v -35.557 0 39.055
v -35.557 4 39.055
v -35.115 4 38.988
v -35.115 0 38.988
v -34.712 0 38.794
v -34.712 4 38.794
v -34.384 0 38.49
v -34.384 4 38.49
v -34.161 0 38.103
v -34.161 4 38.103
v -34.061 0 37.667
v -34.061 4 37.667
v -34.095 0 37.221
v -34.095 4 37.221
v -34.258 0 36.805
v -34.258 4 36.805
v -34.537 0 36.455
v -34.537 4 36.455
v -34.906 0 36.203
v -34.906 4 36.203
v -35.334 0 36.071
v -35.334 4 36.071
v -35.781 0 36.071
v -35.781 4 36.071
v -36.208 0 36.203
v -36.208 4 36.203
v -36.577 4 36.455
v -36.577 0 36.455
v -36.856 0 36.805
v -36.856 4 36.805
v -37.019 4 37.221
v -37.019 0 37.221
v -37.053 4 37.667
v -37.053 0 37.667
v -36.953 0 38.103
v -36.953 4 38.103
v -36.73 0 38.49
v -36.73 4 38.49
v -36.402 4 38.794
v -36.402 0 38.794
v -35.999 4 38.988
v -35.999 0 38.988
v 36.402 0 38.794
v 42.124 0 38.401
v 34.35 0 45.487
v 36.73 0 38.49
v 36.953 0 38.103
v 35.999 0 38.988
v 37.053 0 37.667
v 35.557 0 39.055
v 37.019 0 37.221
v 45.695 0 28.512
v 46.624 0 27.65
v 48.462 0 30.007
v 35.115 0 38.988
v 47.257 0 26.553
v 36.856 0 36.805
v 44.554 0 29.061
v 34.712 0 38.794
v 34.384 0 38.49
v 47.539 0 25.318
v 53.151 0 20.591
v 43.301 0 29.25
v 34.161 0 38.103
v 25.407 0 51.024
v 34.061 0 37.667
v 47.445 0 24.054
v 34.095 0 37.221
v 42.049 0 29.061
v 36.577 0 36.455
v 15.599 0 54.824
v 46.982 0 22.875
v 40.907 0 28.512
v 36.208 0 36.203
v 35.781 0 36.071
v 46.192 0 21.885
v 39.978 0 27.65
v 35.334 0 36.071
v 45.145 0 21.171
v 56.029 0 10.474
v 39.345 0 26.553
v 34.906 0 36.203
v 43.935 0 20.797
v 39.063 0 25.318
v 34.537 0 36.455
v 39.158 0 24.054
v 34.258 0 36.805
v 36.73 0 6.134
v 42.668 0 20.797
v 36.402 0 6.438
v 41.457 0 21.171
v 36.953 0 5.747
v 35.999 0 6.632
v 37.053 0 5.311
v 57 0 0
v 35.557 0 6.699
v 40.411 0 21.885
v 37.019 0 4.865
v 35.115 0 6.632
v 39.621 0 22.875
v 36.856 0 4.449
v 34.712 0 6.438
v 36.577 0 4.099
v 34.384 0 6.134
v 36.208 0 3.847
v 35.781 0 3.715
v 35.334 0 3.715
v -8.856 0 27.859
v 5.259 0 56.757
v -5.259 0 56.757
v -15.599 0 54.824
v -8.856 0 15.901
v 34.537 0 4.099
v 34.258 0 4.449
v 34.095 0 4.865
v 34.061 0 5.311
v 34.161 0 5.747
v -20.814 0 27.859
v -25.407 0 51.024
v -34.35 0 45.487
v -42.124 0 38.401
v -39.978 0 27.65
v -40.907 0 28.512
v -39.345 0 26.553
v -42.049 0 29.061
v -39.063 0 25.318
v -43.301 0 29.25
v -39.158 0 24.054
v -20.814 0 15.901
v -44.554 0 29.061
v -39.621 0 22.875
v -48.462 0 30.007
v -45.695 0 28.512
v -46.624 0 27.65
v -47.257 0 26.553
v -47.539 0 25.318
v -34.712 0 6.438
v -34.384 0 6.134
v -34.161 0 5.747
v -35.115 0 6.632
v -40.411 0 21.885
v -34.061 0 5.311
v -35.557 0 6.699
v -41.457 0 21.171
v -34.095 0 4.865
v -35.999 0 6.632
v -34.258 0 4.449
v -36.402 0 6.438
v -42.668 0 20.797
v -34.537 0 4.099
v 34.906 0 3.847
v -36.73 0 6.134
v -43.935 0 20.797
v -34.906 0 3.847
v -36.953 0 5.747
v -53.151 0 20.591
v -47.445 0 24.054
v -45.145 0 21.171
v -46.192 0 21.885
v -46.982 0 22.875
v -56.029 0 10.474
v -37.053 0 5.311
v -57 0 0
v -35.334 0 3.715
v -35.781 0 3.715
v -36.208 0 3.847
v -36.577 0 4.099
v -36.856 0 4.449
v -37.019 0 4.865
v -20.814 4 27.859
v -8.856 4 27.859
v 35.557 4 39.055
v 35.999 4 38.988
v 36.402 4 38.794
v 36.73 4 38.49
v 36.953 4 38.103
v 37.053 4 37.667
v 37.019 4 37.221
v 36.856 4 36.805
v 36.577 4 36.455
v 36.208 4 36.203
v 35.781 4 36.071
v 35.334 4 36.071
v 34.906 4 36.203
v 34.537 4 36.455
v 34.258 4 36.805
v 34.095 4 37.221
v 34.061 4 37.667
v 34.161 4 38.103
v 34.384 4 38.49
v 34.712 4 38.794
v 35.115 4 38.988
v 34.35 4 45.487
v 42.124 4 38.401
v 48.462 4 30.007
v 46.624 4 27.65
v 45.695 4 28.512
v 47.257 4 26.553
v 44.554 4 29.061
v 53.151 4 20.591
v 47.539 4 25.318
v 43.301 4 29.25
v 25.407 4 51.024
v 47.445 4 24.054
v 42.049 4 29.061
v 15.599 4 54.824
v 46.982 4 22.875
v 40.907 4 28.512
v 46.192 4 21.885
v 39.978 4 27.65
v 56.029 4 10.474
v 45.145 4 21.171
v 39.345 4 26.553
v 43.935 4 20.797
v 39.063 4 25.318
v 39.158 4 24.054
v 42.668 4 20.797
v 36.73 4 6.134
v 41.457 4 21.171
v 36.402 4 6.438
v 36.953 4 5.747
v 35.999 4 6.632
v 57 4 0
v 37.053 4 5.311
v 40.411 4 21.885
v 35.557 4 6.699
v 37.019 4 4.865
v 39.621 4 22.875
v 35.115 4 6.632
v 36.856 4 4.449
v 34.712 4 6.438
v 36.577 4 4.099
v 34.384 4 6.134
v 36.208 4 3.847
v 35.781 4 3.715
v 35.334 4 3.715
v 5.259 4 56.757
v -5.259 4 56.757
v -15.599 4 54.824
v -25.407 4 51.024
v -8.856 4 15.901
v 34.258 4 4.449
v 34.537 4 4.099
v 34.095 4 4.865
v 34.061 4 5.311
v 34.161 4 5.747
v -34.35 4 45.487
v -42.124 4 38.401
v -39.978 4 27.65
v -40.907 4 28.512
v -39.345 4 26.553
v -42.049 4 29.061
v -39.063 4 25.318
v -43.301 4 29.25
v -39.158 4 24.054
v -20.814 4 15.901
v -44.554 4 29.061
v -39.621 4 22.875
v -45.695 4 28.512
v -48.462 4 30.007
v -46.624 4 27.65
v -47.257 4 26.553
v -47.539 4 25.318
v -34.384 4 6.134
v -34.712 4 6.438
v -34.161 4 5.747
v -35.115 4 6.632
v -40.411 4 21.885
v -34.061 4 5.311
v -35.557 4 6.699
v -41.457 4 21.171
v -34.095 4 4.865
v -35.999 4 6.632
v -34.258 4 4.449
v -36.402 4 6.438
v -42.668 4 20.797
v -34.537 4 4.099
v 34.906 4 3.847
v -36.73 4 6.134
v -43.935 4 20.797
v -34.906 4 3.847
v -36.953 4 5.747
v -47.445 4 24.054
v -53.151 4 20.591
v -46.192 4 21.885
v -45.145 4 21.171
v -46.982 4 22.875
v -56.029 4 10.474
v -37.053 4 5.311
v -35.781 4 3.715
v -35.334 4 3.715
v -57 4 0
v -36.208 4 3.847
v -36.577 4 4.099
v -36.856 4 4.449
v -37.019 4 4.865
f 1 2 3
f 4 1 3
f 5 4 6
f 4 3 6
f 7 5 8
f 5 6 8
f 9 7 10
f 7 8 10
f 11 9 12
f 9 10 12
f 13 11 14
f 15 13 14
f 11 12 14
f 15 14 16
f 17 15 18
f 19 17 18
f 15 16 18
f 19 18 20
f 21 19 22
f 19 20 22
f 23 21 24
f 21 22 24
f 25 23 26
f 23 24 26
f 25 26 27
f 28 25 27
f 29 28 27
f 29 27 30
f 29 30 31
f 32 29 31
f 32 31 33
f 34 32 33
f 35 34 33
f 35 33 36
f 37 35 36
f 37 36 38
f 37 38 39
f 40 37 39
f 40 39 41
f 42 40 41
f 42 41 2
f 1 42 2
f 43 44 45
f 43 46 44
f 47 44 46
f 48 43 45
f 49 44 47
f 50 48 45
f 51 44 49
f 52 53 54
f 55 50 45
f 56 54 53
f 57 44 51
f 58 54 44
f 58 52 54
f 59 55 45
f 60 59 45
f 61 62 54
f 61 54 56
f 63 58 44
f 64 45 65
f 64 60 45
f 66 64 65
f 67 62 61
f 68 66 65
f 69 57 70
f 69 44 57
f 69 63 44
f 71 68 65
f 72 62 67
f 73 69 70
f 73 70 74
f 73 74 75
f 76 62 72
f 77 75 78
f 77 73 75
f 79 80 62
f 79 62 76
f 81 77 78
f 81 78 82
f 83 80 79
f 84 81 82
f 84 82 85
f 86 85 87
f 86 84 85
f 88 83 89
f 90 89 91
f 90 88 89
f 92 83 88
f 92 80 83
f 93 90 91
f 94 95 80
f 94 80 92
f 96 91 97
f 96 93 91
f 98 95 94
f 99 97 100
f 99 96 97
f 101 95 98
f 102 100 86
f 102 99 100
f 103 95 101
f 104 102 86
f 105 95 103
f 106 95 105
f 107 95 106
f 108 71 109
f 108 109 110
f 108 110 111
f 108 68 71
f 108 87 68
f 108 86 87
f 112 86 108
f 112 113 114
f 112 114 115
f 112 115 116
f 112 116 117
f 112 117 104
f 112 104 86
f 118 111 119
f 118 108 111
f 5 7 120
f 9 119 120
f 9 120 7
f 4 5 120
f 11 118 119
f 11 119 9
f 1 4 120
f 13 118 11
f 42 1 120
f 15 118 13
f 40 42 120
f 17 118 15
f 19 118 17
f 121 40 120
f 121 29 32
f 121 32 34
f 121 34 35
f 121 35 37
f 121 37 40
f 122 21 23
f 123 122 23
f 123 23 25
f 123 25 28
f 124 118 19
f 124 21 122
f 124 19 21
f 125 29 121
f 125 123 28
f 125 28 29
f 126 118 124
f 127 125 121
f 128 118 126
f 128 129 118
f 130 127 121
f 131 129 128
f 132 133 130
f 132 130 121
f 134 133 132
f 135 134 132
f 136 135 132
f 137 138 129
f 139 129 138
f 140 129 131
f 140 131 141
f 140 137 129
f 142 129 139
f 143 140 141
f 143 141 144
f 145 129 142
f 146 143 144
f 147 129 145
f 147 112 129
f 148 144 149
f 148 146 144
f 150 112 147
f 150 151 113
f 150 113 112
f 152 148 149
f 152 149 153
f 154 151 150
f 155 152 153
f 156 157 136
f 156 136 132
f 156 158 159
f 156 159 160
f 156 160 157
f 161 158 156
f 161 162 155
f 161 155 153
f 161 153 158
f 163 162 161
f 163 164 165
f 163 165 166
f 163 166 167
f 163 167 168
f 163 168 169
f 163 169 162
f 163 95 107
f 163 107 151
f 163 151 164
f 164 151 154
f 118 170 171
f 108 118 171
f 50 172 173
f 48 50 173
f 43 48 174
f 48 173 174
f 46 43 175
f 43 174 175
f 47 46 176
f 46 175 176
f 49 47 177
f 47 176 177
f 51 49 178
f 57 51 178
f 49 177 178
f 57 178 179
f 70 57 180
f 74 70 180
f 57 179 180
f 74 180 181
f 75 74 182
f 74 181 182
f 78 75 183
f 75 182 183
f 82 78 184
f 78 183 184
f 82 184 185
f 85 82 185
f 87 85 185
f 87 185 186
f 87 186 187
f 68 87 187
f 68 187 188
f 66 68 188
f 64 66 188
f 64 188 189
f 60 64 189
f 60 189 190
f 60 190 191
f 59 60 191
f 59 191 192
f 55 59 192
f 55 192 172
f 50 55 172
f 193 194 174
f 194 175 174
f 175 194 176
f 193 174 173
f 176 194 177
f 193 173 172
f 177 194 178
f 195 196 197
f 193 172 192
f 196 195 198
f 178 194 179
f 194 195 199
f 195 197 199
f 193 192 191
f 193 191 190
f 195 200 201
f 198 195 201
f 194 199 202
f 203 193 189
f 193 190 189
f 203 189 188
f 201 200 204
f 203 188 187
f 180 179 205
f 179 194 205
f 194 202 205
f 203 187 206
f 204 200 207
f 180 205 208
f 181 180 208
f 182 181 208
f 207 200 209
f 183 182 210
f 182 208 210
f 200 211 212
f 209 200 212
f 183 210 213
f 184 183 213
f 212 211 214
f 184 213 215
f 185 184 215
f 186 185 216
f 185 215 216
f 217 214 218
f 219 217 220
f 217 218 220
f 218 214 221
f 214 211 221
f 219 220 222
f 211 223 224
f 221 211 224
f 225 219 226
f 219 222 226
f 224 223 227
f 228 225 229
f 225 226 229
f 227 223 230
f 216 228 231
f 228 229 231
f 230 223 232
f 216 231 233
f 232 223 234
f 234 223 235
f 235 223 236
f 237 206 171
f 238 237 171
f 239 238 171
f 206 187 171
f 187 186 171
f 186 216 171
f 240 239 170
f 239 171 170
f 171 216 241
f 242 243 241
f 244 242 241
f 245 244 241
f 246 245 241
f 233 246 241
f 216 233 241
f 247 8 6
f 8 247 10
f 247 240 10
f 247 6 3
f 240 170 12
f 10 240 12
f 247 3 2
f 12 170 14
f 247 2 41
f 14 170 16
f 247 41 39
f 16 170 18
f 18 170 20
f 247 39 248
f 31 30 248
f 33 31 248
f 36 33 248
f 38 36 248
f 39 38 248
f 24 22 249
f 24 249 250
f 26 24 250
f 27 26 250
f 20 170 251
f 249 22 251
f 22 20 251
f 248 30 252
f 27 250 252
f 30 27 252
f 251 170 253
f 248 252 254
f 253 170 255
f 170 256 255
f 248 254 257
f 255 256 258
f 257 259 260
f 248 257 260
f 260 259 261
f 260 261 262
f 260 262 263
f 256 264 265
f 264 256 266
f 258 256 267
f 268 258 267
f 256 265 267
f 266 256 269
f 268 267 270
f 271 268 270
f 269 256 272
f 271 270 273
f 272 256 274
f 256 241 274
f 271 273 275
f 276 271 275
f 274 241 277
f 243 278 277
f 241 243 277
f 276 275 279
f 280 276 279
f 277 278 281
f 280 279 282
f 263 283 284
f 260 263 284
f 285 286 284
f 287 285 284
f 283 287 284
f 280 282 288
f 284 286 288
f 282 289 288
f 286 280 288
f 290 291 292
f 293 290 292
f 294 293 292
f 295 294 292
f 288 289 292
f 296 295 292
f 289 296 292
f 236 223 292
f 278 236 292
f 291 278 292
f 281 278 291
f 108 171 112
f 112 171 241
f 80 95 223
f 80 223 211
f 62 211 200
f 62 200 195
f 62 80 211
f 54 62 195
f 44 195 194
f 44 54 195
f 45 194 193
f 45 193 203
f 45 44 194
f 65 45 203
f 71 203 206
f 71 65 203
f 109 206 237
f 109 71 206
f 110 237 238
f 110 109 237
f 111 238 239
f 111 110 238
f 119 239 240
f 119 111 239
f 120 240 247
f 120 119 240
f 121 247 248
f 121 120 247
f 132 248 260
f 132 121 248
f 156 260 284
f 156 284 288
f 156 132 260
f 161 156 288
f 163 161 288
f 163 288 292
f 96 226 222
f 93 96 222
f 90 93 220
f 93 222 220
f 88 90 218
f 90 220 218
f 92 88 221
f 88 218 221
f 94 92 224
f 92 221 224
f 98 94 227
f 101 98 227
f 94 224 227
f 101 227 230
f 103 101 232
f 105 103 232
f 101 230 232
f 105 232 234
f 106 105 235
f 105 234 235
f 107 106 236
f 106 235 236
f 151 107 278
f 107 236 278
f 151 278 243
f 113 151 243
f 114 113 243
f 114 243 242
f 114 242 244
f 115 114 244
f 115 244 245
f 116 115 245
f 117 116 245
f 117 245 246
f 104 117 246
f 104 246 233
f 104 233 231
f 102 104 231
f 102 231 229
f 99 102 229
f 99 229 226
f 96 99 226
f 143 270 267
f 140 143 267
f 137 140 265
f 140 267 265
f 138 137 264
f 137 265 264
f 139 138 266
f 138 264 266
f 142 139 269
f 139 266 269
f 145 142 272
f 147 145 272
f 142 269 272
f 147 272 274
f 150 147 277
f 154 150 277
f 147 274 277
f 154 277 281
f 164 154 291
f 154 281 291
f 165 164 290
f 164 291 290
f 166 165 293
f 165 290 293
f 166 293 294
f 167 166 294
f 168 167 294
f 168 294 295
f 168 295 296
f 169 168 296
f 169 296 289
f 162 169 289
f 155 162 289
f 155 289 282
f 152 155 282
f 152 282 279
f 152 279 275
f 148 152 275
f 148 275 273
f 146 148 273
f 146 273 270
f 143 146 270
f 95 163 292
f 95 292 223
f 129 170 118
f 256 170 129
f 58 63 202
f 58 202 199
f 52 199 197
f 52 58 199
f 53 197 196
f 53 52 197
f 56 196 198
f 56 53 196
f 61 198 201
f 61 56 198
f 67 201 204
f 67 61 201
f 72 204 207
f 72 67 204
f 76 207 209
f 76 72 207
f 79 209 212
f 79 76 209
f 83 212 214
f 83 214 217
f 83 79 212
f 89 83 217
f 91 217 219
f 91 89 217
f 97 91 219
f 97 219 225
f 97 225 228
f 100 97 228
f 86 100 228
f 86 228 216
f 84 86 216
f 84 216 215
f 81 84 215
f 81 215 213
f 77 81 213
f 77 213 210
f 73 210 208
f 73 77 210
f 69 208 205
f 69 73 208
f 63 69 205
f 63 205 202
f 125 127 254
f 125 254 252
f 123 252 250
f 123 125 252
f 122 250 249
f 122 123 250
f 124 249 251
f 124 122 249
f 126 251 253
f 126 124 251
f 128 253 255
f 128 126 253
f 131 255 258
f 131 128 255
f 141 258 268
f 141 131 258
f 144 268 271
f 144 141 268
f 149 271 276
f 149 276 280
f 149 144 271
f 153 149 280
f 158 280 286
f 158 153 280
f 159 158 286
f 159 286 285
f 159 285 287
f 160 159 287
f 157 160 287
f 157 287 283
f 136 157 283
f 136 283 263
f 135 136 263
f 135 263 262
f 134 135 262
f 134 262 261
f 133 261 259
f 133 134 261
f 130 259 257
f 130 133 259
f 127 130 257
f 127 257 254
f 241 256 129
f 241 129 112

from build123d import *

# Parameters (mm, degrees)
ESQUISSE1_R             = 4.25
ESQUISSE1_W             = 62.5
ESQUISSE1_H             = 25
BOSS_EXTRU_1_DEPTH      = 4
ESQUISSE2_R             = 1.5
ENL_V_MAT_EXTRU_1_DEPTH = 81.709355096
ESQUISSE3_W             = 66.086844216
ESQUISSE3_H             = 27.920410929
BOSS_EXTRU_2_DEPTH      = 4
ESQUISSE5_W             = 11.958205263
ESQUISSE5_H             = 11.958205263
ENL_V_MAT_EXTRU_2_DEPTH = 81.709355096


with BuildPart() as part:
    # Esquisse1 → Boss.-Extru.1 (new body)
    with BuildSketch(Plane(origin=(0, 0, 0), x_dir=(1, 0, 0), z_dir=(0, 1, 0))):
        with BuildLine():
            Line((-57, 0), (57, 0))
            ThreePointArc((57, 0), (0, -57), (-57, 0))
        make_face()
        with Locations(Location((-43.301270189, -25, 0), (0, 0, 270))):
            Circle(ESQUISSE1_R, mode=Mode.SUBTRACT)
        with Locations(Location((43.301270189, -25, 0), (0, 0, 270))):
            Circle(ESQUISSE1_R, mode=Mode.SUBTRACT)
        with Locations((0, -22.5)):
            Rectangle(ESQUISSE1_W, ESQUISSE1_H, mode=Mode.SUBTRACT)
    extrude(amount=BOSS_EXTRU_1_DEPTH)

    # Esquisse2 → Enlèv. mat.-Extru.1 (cut, through all)
    with BuildSketch(Plane(origin=(0, 4, 0), x_dir=(1, 0, 0), z_dir=(0, 1, 0))):
        with Locations(Location((-35.557071612, -37.554578926, 0), (0, 0, 270))):
            Circle(ESQUISSE2_R)
        with Locations(Location((-35.557071612, -5.198506408, 0), (0, 0, 270))):
            Circle(ESQUISSE2_R)
        with Locations(Location((35.557071612, -5.198506408, 0), (0, 0, 270))):
            Circle(ESQUISSE2_R)
        with Locations(Location((35.557071612, -37.554578926, 0), (0, 0, 270))):
            Circle(ESQUISSE2_R)
    extrude(amount=-ENL_V_MAT_EXTRU_1_DEPTH, mode=Mode.SUBTRACT)

    # Esquisse3 → Boss.-Extru.2 (add)
    with BuildSketch(Plane(origin=(0, 4, 0), x_dir=(1, 0, 0), z_dir=(0, 1, 0))):
        with Locations((0, -22.864687702)):
            Rectangle(ESQUISSE3_W, ESQUISSE3_H)
    extrude(amount=-BOSS_EXTRU_2_DEPTH)

    # Esquisse5 → Enlèv. mat.-Extru.2 (cut, through all)
    with BuildSketch(Plane(origin=(0, 4, 0), x_dir=(1, 0, 0), z_dir=(0, 1, 0))):
        with Locations((-14.835187955, -21.879845073)):
            Rectangle(ESQUISSE5_W, ESQUISSE5_H)
    extrude(amount=-ENL_V_MAT_EXTRU_2_DEPTH, mode=Mode.SUBTRACT)


solid = part.part
